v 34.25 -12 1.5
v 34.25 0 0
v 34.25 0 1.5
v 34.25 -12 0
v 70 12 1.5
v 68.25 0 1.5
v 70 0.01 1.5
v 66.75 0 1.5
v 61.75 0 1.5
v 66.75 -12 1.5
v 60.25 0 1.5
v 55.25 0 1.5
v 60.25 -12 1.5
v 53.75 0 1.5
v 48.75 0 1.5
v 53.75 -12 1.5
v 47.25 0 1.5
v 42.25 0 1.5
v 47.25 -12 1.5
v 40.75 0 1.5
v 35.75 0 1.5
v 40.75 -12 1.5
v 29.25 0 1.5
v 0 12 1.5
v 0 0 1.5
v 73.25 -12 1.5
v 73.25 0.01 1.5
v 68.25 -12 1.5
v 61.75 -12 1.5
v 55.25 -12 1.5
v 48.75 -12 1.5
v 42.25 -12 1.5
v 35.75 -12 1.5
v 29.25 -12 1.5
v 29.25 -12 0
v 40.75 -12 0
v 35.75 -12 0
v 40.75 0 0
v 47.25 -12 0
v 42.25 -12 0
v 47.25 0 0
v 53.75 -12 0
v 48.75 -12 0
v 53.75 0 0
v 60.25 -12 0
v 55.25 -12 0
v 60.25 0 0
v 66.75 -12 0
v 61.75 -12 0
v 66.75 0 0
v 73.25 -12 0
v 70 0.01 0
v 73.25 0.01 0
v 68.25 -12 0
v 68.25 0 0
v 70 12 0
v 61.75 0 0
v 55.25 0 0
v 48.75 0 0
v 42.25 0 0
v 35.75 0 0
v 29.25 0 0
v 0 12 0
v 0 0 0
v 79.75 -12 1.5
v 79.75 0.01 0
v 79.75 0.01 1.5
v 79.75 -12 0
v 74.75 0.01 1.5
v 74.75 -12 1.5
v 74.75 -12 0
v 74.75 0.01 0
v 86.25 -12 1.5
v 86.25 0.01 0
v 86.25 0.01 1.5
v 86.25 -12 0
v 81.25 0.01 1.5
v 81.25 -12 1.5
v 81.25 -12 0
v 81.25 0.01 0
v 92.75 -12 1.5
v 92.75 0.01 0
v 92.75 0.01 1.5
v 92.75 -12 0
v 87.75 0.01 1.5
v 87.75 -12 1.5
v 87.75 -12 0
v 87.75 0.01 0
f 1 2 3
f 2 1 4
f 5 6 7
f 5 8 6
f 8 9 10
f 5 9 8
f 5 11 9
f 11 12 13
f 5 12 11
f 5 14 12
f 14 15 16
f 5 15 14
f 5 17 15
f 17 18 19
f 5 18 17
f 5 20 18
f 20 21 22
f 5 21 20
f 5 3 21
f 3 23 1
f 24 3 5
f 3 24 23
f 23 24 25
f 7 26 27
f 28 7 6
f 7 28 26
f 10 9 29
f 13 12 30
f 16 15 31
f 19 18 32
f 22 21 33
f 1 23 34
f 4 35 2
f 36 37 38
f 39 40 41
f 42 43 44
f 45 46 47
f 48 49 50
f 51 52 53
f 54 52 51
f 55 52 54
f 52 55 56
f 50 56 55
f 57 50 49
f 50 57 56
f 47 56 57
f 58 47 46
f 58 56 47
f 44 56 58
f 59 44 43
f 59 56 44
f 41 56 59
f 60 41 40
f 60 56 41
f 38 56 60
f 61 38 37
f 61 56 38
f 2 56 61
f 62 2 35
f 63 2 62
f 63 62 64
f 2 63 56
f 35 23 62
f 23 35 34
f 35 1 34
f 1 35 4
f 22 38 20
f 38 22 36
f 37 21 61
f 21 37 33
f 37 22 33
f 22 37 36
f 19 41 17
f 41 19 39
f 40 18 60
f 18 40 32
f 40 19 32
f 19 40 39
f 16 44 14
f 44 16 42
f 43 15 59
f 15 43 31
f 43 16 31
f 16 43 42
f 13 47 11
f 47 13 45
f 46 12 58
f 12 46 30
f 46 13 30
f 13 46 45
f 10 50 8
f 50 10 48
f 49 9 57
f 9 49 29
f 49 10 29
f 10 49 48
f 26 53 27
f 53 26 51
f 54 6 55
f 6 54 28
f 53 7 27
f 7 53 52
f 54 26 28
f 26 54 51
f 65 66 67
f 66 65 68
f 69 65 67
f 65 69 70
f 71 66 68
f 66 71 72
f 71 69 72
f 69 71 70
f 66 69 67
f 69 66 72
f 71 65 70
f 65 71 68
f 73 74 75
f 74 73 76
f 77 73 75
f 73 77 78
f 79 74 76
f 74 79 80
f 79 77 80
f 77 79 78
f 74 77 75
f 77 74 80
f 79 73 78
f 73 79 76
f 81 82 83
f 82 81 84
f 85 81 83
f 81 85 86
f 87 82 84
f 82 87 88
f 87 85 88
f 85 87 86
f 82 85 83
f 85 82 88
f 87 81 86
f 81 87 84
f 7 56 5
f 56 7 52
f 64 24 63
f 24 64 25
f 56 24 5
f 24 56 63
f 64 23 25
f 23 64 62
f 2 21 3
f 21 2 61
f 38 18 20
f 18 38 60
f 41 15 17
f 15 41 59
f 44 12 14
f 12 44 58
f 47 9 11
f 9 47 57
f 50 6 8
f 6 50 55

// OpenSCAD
// 10-well agarose gel comb - printed flat on the bed
// Units: mm

$fn = 64;

// ---- Parameters ----
plate_t     = 1.5;   // plate thickness (Z)
spine_len   = 70;    // spine length (X)
spine_w     = 12;    // spine width (Y)
n_teeth     = 10;    // number of teeth / wells
tooth_w     = 5.0;   // tooth width (X)
tooth_len   = 12;    // tooth length (Y), hanging in -Y
tooth_gap   = 1.5;   // gap between neighbouring teeth (X)
overlap     = 0.01;  // small overlap so teeth fuse into spine

// ---- Derived ----
row_w   = n_teeth * tooth_w + (n_teeth - 1) * tooth_gap; // total width of tooth row
total_y = spine_w + tooth_len;                          // overall Y extent
y0      = -total_y / 2;                                  // bottom (tooth tips) Y

// ---- Model ----
union() {
    // Spine (back bar)
    translate([0, y0 + tooth_len, 0])
        cube([spine_len, spine_w, plate_t]);

    // Teeth, centred on spine in X
    for (i = [0 : n_teeth - 1])
        translate([(row_w / 2 - tooth_w / 2) + i * (tooth_w + tooth_gap), y0, 0])
            cube([tooth_w, tooth_len + overlap, plate_t]);
}
